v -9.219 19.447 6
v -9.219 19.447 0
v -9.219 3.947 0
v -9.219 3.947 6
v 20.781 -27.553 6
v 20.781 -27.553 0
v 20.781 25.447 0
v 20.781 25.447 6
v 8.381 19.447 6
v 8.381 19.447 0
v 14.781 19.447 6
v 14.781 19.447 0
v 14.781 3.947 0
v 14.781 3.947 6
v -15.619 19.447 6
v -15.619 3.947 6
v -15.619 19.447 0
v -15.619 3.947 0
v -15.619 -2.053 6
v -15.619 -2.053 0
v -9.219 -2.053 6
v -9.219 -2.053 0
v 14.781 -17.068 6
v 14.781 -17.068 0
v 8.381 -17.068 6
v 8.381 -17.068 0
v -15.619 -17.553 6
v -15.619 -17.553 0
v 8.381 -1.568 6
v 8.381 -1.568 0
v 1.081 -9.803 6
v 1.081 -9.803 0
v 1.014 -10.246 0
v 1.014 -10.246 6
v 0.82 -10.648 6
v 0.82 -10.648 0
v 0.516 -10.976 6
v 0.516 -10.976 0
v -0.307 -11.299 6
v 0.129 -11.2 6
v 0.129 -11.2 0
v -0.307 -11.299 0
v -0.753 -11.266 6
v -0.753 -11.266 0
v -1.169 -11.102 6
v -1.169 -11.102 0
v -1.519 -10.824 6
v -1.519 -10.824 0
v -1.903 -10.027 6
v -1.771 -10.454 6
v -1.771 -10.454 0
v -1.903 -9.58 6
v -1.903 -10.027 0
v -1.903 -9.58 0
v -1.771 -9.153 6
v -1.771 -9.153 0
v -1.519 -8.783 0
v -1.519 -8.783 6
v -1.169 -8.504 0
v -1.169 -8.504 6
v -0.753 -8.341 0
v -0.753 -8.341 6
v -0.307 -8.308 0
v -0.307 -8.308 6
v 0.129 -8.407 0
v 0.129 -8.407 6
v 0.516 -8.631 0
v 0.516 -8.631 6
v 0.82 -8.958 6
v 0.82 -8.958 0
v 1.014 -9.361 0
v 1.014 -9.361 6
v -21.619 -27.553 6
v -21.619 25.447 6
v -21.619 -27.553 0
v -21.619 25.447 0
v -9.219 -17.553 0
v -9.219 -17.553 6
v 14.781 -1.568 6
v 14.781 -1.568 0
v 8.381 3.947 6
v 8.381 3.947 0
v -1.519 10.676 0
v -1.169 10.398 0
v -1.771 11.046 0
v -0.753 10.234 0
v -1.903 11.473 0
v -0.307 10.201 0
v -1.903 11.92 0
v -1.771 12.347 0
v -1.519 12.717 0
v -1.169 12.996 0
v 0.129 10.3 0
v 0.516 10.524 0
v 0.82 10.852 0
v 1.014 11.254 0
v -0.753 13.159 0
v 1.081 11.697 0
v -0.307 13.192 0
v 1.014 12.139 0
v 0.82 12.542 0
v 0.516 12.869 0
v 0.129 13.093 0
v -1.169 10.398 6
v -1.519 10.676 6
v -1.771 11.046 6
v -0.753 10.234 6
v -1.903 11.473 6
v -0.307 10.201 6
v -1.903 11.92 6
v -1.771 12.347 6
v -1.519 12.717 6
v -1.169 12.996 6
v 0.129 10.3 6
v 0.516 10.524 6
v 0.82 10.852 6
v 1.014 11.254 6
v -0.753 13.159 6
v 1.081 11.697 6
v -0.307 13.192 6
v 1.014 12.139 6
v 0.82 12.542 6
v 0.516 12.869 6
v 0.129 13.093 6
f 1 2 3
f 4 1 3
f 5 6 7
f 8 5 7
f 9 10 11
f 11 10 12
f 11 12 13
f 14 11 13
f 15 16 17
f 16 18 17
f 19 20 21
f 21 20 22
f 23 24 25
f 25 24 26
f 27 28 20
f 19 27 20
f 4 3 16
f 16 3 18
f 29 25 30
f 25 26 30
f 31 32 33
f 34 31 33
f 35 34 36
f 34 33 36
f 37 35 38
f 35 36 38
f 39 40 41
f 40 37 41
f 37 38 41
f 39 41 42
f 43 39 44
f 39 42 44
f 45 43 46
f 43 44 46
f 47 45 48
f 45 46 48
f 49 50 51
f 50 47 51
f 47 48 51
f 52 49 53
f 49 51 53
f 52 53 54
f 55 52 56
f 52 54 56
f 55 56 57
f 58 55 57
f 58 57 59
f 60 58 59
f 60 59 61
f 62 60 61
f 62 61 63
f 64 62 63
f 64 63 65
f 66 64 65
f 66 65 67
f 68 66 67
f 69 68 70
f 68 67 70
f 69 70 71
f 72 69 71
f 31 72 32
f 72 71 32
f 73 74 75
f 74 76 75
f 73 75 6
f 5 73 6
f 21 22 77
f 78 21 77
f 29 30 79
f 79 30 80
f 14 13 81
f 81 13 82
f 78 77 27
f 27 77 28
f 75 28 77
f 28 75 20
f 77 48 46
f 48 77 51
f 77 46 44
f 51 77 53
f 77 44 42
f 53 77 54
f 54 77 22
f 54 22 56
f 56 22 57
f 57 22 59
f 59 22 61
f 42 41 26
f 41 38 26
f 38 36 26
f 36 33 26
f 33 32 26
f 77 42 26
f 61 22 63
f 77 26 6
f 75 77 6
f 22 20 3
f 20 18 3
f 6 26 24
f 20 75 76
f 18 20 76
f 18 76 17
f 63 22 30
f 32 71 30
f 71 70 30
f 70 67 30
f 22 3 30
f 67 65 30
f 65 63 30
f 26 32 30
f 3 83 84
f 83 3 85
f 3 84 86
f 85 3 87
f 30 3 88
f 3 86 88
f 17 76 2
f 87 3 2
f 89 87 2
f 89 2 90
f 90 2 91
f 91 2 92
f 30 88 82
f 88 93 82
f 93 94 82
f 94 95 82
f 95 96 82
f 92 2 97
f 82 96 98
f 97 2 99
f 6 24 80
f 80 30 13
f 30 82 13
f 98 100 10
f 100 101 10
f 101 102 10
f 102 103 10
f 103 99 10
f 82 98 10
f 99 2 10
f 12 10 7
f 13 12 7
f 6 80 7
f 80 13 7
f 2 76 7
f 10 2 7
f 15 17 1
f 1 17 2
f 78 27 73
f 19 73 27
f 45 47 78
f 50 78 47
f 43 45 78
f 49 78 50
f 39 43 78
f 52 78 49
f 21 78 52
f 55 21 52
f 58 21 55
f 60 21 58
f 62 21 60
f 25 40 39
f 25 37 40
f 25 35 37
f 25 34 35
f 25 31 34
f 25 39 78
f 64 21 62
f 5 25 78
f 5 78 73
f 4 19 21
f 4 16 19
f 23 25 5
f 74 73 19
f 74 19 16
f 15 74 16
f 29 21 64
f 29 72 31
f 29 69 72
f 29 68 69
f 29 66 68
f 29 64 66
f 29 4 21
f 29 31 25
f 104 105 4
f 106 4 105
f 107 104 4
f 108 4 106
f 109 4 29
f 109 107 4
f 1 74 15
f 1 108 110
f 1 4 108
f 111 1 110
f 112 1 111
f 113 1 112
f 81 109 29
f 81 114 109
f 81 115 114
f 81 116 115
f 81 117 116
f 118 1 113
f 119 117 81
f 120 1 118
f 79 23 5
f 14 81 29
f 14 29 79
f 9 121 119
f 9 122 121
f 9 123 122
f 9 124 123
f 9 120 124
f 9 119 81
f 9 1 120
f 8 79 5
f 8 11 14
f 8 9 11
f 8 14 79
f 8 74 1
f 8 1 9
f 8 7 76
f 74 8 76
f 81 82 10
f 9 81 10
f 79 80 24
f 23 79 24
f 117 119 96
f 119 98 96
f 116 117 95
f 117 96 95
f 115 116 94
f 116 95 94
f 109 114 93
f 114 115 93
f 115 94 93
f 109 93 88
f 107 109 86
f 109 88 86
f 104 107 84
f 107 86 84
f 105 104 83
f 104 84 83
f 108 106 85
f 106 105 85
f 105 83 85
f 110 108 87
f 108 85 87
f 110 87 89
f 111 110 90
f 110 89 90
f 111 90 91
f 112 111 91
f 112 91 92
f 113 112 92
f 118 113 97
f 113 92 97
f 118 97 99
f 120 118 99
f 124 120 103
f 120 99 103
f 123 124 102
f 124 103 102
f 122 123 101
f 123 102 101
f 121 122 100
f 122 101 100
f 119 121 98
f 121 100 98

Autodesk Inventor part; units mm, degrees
ref_plane "YZ Plane" through (0, 0, 0) normal (1, 0, 0) x (0, 1, 0)
ref_plane "XZ Plane" through (0, 0, 0) normal (0, 1, 0) x (-1, 0, 0)
ref_plane "XY Plane" through (0, 0, 0) normal (0, 0, 1) x (1, 0, 0)
sketch "Sketch1" plane through (0, 0, 0) normal (0, 0, 1) x (1, 0, 0)
  line L0 (-9.2194, -2.0534) -> (-9.2194, -17.5534)
  line L1 (-9.2194, -17.5534) -> (-15.6194, -17.5534)
  line L2 (-15.6194, -17.5534) -> (-15.6194, -2.0534)
  line L3 (-15.6194, -2.0534) -> (-9.2194, -2.0534)
  line L4 (-9.2194, 19.4466) -> (-9.2194, 3.9466)
  line L5 (-9.2194, 3.9466) -> (-15.6194, 3.9466)
  line L6 (-15.6194, 3.9466) -> (-15.6194, 19.4466)
  line L7 (-15.6194, 19.4466) -> (-9.2194, 19.4466)
  line L8 (14.7806, 19.4466) -> (14.7806, 3.9466)
  line L9 (14.7806, 3.9466) -> (8.3806, 3.9466)
  line L10 (8.3806, 3.9466) -> (8.3806, 19.4466)
  line L11 (8.3806, 19.4466) -> (14.7806, 19.4466)
  line L12 (14.7806, -1.568) -> (14.7806, -17.068)
  line L13 (14.7806, -17.068) -> (8.3806, -17.068)
  line L14 (8.3806, -17.068) -> (8.3806, -1.568)
  line L15 (8.3806, -1.568) -> (14.7806, -1.568)
  line L16 (20.7806, -27.5534) -> (20.7806, 25.4466)
  line L17 (20.7806, 25.4466) -> (-21.6194, 25.4466)
  line L18 (-21.6194, 25.4466) -> (-21.6194, -27.5534)
  line L19 (-21.6194, -27.5534) -> (20.7806, -27.5534)
  circle A0 centre (-0.4194, 11.6966) radius 1.5
  circle A1 centre (-0.4194, -9.8034) radius 1.5
  point P0 (0, 0)
extrude "Extrusion1" add sketch "Sketch1" along normal blind 6
properties part number "spoolHolderHolder"
